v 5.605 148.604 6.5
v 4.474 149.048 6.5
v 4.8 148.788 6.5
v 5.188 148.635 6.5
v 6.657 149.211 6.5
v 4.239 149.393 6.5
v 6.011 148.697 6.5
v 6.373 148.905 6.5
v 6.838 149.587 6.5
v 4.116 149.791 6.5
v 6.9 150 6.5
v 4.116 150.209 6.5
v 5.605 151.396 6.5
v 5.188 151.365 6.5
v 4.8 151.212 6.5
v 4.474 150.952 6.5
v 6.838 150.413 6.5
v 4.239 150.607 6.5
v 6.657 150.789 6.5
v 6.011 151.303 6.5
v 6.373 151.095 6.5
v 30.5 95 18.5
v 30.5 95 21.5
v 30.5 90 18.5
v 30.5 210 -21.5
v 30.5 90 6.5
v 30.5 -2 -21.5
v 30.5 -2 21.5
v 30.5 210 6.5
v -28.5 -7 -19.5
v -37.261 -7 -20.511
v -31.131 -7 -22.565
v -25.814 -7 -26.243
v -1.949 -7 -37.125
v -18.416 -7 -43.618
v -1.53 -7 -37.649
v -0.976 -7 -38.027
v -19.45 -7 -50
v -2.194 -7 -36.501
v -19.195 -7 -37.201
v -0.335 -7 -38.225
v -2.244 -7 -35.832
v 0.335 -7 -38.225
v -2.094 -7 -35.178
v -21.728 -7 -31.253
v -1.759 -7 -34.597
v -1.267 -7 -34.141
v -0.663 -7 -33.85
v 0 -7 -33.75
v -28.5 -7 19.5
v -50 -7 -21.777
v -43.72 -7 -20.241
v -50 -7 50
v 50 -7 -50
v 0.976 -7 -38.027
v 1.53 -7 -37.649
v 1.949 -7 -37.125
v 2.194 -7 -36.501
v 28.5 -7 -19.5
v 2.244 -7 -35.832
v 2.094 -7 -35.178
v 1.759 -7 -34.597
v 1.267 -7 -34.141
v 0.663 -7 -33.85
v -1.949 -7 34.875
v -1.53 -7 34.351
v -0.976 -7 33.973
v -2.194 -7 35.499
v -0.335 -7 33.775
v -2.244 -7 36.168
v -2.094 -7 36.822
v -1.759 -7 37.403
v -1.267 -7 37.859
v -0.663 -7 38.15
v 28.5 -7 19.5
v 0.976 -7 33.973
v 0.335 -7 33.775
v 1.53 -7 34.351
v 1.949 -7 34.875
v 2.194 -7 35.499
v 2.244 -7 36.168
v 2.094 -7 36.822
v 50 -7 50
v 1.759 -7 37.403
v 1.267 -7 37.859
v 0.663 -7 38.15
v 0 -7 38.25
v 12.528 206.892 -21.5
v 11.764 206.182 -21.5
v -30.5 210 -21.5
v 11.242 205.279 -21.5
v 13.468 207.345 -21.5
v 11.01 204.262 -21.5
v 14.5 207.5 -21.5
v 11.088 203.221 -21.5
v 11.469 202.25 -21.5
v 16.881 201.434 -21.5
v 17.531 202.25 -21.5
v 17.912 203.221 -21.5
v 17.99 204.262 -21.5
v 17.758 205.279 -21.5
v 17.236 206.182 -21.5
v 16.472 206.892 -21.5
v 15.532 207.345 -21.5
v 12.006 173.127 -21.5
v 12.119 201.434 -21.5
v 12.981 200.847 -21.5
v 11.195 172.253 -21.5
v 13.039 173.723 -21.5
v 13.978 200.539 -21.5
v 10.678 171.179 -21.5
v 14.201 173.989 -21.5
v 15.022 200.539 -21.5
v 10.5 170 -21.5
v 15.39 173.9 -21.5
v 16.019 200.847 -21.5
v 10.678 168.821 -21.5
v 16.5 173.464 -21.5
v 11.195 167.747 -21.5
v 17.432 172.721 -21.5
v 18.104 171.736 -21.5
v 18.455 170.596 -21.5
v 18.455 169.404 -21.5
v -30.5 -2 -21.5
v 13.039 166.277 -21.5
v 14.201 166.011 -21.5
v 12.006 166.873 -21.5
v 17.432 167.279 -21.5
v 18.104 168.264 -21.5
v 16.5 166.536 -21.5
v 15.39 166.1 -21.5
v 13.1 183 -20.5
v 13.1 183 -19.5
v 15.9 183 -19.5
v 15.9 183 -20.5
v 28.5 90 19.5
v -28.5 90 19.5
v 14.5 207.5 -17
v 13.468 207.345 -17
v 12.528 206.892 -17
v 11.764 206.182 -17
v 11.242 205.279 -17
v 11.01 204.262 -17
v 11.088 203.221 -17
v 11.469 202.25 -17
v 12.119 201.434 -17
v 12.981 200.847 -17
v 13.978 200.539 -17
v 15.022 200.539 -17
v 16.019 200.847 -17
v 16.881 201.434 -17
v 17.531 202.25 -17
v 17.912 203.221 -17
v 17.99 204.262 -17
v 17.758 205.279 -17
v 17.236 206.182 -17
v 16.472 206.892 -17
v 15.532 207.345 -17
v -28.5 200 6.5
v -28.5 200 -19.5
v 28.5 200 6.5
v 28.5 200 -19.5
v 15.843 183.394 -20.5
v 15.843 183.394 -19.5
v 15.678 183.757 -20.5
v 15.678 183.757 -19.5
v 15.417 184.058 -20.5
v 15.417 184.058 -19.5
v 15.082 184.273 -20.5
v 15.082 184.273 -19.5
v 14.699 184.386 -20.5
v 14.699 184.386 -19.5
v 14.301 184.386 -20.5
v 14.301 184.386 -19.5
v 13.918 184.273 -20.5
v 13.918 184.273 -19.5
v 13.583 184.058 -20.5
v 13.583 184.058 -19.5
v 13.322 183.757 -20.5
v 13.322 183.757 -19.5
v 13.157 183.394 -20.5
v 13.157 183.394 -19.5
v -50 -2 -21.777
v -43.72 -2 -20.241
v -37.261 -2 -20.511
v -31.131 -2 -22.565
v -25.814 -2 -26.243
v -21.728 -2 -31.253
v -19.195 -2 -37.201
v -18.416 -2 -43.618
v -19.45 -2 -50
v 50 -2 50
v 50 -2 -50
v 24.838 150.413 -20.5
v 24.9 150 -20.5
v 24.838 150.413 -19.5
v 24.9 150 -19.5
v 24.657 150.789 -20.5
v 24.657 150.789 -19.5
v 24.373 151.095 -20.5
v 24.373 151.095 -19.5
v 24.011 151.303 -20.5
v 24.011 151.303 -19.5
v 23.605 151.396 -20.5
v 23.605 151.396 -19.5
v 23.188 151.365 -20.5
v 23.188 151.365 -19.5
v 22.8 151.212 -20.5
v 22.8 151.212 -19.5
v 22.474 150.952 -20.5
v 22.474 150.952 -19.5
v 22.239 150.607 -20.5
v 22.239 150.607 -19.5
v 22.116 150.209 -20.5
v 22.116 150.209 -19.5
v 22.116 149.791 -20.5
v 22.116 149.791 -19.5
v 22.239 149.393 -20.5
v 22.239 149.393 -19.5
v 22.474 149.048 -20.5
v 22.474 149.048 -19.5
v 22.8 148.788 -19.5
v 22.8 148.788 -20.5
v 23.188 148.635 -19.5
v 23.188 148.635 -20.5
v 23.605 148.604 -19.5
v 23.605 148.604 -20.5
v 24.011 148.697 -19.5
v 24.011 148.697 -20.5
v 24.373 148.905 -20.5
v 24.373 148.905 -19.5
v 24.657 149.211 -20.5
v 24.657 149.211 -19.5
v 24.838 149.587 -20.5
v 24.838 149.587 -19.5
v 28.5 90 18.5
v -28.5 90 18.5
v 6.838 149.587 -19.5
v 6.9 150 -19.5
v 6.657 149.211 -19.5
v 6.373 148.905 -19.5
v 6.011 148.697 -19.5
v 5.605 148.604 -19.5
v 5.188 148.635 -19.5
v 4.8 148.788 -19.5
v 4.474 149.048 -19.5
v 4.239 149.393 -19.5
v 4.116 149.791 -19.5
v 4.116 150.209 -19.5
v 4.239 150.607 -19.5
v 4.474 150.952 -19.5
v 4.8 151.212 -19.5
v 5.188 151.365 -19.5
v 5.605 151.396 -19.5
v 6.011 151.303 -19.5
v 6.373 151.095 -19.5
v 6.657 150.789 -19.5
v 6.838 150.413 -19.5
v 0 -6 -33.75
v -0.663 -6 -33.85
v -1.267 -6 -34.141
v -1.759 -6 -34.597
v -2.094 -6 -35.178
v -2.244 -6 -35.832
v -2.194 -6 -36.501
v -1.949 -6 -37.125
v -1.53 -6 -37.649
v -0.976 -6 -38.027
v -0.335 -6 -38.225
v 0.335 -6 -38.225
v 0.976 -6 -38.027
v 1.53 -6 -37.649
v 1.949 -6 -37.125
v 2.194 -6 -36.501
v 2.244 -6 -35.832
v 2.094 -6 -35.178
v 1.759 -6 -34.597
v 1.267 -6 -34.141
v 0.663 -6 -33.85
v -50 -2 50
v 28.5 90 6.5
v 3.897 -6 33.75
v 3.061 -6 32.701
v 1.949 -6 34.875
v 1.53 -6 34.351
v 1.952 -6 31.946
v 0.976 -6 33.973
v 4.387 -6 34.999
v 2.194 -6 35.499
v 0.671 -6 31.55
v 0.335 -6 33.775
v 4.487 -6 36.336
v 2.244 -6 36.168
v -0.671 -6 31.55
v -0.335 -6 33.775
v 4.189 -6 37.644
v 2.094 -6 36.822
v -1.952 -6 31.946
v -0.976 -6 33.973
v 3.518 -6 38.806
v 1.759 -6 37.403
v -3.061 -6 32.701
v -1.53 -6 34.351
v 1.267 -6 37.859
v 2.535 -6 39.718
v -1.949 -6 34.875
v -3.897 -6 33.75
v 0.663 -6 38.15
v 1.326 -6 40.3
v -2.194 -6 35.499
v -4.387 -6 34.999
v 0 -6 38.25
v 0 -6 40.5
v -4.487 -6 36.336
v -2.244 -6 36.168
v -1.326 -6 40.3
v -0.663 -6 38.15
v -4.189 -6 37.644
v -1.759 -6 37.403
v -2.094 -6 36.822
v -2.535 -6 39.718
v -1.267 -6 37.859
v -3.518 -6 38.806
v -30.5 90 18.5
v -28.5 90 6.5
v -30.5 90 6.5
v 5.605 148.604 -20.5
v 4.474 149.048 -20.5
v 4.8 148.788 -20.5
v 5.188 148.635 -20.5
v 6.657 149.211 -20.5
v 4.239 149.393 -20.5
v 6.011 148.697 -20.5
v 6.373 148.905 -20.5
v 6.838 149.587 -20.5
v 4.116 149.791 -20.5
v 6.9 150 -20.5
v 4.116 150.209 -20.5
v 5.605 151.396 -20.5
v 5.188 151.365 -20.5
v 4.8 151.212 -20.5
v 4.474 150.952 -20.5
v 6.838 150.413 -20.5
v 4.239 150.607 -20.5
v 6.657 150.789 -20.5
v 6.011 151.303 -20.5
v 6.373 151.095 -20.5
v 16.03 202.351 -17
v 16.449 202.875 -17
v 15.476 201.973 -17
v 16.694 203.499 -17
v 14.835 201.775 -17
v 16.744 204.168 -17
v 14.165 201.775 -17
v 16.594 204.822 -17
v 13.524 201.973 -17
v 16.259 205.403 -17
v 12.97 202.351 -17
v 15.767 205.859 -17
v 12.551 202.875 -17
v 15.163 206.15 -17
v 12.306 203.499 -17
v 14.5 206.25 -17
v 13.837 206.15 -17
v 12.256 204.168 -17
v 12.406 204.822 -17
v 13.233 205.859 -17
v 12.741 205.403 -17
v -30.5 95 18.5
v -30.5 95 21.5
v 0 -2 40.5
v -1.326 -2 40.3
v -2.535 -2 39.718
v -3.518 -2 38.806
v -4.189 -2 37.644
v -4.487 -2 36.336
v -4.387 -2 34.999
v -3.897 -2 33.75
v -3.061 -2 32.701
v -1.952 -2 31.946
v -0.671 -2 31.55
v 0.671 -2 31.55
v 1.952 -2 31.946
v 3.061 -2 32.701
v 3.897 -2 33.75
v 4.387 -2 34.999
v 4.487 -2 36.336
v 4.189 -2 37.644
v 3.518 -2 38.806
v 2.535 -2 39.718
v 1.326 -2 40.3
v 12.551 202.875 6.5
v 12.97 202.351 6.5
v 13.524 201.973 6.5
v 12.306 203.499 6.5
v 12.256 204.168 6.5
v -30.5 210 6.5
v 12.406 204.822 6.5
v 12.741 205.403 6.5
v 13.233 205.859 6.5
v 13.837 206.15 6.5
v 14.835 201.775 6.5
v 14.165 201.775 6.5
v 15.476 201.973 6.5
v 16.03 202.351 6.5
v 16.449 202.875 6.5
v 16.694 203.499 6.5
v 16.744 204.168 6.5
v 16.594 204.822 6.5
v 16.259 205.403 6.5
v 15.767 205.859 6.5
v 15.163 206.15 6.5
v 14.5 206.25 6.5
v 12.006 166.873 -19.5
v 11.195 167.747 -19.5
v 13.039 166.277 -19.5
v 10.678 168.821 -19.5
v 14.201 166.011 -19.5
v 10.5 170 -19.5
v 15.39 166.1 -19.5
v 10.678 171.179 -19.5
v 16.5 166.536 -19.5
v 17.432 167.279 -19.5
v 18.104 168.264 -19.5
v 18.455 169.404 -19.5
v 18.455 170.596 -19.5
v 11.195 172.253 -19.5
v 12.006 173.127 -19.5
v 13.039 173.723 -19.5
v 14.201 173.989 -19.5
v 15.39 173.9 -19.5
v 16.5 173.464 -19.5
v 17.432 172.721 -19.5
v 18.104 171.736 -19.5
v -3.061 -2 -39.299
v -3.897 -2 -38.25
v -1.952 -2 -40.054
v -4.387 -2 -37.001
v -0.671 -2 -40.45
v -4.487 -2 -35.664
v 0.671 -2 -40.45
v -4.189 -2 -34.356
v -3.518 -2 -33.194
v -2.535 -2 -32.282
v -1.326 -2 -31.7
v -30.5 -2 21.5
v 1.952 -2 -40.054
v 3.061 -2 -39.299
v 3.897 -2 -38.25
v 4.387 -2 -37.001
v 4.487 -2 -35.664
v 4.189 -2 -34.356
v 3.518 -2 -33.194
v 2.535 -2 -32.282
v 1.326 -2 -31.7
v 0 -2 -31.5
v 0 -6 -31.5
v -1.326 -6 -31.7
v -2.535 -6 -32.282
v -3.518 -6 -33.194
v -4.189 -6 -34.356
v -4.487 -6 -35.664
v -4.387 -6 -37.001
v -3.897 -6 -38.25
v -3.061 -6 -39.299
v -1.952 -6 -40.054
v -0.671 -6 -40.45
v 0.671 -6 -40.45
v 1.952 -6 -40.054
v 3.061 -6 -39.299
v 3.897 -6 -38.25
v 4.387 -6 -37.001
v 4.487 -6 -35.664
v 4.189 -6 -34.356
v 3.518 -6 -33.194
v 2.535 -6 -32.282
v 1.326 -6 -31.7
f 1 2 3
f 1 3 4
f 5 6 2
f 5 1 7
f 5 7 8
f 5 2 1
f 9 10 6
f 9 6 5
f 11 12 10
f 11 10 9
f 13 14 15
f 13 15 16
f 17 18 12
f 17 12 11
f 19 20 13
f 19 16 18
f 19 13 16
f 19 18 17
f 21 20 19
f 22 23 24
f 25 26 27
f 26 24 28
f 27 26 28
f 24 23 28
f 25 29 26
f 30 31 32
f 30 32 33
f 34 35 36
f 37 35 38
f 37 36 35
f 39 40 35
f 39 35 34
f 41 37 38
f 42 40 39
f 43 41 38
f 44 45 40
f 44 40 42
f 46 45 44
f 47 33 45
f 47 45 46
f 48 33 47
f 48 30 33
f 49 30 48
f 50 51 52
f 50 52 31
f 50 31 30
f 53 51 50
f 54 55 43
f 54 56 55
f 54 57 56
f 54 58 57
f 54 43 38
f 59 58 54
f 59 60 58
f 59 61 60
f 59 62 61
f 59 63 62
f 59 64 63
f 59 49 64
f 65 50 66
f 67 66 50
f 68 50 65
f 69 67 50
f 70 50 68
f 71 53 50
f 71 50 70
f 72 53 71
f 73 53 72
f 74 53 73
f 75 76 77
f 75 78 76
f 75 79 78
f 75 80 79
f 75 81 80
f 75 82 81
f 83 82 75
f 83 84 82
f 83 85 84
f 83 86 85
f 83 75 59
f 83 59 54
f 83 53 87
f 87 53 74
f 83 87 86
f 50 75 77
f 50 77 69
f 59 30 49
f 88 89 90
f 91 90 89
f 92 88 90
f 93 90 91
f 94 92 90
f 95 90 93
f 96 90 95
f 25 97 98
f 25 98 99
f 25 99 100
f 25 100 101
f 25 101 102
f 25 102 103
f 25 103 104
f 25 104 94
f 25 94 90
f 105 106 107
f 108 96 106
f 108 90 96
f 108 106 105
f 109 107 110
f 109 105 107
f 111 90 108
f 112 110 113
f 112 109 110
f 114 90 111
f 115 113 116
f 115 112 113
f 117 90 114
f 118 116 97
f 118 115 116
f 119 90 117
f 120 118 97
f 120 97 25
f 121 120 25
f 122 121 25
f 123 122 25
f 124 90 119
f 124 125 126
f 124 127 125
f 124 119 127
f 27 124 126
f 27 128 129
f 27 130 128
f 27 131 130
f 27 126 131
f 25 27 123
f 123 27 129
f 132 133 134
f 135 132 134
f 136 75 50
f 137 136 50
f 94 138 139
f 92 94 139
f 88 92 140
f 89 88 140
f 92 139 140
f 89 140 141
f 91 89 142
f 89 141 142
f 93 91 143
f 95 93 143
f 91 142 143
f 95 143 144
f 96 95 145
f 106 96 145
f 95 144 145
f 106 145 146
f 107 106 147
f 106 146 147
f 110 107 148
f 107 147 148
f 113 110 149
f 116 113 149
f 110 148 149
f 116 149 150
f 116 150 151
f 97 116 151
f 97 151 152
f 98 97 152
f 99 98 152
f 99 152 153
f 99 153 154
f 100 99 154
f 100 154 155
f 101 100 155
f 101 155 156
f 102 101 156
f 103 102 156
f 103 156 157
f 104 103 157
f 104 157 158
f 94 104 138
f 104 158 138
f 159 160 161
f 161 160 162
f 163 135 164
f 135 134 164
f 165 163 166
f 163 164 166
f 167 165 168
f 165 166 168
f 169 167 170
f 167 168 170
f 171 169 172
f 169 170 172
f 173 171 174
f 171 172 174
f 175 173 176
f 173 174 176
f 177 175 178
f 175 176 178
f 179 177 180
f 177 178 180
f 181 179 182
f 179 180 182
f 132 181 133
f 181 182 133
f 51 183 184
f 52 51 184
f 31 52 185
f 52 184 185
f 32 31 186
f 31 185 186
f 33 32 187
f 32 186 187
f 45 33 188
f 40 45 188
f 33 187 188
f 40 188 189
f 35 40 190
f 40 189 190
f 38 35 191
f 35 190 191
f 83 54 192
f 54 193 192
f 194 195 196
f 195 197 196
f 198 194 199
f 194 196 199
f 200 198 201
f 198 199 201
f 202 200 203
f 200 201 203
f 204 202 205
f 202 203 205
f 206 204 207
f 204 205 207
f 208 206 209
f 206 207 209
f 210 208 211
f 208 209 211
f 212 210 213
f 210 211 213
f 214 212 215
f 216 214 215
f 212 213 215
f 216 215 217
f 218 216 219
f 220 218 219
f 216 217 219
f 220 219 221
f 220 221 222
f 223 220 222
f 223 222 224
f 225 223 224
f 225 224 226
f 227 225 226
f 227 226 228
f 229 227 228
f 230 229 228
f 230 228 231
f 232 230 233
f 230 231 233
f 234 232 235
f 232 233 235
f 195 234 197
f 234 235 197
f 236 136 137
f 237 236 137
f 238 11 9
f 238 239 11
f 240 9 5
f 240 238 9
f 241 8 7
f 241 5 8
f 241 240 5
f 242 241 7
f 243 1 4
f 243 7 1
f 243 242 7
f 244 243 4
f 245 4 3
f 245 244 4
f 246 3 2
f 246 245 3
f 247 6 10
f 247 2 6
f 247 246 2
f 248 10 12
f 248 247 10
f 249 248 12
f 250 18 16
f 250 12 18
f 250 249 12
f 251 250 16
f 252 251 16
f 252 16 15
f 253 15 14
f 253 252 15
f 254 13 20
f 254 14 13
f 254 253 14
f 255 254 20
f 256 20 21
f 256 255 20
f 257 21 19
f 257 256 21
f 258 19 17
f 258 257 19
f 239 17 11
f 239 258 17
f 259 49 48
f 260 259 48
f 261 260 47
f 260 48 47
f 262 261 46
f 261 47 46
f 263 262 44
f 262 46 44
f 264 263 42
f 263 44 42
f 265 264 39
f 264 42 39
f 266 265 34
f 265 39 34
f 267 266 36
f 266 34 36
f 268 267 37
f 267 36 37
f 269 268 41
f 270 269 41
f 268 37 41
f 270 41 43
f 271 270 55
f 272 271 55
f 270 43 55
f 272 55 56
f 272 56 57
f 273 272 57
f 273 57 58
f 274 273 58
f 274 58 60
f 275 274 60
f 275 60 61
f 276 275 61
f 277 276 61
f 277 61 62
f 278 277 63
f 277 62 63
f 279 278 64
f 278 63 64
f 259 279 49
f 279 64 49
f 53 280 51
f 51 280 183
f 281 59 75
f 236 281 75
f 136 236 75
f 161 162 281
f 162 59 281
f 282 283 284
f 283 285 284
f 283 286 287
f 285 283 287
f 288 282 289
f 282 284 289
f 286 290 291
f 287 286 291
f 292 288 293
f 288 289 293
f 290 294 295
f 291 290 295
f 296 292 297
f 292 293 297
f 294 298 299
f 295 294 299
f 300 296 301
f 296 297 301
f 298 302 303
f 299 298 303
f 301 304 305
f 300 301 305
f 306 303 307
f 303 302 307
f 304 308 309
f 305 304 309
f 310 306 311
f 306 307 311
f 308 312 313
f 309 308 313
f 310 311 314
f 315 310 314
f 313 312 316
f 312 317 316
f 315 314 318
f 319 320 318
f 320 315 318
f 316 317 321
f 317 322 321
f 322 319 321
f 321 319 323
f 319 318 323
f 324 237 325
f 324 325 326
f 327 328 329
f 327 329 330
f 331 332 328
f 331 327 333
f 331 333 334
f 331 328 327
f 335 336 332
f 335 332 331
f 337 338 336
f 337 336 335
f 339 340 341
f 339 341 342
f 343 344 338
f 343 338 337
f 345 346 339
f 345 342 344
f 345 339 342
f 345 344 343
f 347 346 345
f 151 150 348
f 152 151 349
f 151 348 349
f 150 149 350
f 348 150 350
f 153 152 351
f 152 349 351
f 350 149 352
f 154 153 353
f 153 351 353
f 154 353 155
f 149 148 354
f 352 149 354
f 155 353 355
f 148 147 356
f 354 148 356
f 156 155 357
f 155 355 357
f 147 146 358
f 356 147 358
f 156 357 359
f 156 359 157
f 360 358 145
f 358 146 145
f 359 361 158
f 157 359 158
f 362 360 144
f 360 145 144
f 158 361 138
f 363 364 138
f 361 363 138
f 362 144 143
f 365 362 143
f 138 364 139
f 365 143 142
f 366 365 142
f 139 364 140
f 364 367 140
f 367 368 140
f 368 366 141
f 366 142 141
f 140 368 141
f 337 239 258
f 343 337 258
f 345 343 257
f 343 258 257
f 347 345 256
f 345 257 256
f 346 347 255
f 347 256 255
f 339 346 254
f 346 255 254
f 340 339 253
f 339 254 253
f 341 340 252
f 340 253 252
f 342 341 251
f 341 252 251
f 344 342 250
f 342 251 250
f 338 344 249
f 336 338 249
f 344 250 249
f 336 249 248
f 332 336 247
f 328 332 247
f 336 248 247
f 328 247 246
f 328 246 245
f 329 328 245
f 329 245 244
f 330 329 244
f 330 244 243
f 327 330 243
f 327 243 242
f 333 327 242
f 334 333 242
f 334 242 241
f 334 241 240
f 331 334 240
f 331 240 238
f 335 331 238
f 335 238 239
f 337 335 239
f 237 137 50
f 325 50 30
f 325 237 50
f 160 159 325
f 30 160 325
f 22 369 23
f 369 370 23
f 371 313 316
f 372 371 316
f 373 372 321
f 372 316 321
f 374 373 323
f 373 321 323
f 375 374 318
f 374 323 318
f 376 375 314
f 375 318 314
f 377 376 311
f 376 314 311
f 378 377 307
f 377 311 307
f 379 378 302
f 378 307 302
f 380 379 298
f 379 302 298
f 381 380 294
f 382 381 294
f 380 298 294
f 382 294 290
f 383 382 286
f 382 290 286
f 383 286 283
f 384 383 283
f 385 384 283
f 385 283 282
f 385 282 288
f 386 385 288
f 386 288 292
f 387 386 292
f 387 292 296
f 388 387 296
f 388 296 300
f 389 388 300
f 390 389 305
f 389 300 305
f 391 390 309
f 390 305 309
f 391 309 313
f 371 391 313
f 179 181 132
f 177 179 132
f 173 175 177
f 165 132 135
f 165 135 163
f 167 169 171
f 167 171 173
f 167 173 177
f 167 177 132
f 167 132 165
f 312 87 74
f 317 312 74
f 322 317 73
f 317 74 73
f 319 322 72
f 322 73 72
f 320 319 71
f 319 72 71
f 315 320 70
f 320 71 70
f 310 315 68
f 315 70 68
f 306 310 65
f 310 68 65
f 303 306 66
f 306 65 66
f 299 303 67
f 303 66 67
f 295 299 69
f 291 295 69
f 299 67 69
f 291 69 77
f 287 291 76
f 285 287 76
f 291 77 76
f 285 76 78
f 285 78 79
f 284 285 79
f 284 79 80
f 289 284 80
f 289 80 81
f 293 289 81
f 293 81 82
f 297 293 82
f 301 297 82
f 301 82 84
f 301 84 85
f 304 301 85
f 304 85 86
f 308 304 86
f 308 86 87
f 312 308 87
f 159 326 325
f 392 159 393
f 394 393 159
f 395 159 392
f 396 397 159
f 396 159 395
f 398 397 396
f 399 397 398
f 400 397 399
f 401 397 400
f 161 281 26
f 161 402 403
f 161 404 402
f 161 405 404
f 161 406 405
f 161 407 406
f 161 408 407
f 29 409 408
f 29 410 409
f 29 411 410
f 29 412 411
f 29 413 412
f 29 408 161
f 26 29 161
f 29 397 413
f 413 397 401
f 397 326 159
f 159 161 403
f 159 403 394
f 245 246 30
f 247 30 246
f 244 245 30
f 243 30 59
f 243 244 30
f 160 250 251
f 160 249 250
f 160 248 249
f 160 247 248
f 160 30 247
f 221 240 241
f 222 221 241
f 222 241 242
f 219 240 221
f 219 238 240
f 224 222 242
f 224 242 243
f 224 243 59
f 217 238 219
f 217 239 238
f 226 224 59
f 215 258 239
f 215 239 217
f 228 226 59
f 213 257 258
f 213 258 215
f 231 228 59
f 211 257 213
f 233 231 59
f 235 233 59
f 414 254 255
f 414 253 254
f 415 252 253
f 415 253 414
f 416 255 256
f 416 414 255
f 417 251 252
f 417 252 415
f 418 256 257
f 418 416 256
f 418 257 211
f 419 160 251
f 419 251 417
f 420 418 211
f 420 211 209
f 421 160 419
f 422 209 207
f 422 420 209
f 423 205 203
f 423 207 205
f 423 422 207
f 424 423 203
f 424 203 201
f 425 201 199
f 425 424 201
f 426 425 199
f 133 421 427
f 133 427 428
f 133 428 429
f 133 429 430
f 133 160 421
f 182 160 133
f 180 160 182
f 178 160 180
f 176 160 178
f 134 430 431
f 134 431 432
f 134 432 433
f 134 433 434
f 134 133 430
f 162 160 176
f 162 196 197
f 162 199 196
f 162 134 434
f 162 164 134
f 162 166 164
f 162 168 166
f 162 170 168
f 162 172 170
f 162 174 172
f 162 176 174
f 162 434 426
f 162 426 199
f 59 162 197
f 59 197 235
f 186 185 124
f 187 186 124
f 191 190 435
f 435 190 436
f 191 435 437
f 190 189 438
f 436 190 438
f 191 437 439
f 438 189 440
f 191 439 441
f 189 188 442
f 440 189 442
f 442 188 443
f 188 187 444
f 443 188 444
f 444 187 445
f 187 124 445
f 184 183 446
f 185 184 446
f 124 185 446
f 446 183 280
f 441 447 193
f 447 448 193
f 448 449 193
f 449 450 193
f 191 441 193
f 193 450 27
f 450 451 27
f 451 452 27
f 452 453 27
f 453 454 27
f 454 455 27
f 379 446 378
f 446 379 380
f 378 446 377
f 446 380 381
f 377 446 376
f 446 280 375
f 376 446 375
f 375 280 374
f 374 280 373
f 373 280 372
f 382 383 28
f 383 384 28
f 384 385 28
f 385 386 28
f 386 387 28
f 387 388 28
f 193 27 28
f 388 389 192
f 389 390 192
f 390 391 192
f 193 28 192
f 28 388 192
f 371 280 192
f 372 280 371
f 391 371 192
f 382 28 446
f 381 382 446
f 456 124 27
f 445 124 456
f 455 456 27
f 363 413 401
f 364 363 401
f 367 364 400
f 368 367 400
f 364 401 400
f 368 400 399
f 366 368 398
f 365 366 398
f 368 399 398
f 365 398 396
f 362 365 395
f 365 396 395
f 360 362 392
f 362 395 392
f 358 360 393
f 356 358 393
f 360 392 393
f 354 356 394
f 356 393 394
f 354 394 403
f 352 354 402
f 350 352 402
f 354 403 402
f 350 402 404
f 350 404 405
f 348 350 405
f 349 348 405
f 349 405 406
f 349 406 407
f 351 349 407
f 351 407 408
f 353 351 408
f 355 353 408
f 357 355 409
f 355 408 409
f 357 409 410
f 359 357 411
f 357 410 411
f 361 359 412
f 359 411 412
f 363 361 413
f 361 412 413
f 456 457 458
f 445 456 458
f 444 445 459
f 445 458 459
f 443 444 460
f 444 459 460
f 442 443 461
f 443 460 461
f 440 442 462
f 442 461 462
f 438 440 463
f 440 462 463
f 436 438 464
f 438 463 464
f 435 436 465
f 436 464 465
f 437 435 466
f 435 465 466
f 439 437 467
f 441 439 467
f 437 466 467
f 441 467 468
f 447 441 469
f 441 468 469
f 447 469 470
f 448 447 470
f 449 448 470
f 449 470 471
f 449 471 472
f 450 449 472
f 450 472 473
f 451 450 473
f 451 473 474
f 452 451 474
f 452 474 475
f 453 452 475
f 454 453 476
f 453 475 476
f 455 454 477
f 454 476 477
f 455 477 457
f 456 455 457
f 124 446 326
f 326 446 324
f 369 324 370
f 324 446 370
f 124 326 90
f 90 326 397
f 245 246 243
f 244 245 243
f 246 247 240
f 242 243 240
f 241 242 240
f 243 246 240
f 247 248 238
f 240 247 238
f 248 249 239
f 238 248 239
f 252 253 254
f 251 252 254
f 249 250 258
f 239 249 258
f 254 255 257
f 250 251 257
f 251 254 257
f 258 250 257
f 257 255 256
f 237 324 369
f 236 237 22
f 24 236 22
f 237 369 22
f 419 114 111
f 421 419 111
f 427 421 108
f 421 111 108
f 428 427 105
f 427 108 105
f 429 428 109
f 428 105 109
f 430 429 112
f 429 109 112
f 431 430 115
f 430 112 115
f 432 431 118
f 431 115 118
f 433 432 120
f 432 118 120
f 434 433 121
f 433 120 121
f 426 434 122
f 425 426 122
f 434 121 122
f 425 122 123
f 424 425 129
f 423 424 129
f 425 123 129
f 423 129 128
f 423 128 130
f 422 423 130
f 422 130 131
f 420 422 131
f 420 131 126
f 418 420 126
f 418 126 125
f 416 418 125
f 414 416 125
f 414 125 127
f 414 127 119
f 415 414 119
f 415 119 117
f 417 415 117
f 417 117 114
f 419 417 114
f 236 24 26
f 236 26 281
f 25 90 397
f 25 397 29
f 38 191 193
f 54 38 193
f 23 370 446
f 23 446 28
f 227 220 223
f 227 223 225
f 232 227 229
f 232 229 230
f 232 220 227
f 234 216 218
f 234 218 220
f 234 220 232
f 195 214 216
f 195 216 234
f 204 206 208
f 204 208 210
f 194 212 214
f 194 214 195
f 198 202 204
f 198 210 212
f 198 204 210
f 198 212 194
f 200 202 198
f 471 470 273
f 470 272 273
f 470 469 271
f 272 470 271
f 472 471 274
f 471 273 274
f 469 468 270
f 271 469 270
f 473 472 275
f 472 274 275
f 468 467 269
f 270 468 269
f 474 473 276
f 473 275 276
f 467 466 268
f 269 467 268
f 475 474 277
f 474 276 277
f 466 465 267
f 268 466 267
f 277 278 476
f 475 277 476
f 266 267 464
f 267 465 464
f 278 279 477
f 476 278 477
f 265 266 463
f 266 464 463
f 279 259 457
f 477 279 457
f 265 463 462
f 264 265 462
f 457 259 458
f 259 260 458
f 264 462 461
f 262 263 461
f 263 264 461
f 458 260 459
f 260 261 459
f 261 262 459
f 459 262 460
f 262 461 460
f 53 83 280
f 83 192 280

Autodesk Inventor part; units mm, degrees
ref_plane "YZ Plane" through (0, 0, 0) normal (1, 0, 0) x (0, 1, 0)
ref_plane "XZ Plane" through (0, 0, 0) normal (0, 1, 0) x (-1, 0, 0)
ref_plane "XY Plane" through (0, 0, 0) normal (0, 0, 1) x (1, 0, 0)
sketch "Sketch1" plane through (0, 0, 0) normal (0, 1, 0) x (-1, 0, 0)
  line L0 (-28.5, 19.5) -> (28.5, 19.5)
  line L1 (28.5, 19.5) -> (28.5, -19.5)
  line L2 (28.5, -19.5) -> (-28.5, -19.5)
  line L3 (-28.5, -19.5) -> (-28.5, 19.5)
  line L4 (-28.5, 19.5) -> (28.5, -19.5) construction
  line L5 (28.5, 19.5) -> (-28.5, -19.5) construction
  line L6 (-30.5, 21.5) -> (30.5, 21.5)
  line L7 (30.5, 21.5) -> (30.5, -21.5)
  line L8 (30.5, -21.5) -> (-30.5, -21.5)
  line L9 (-30.5, -21.5) -> (-30.5, 21.5)
  line L10 (-30.5, 21.5) -> (30.5, -21.5) construction
  line L11 (30.5, 21.5) -> (-30.5, -21.5) construction
  point P0 (0, 0)
  point P1 (0, -19.5)
  point P2 (0, -21.5)
  point P3 (0, 0)
  point P4 (0, 0)
  dimension "d1" = 57
  dimension "d2" = 39
  dimension "d3" = 61
  dimension "d4" = 43
extrude "Extrusion2" add sketch "Sketch1" against normal blind 2 contours L0 L1 L2 L3 | L6 L7 L8 L9
extrude "Extrusion3" add sketch "Sketch1" along normal blind 200
sketch "Sketch2" plane through (0, 200, 0) normal (0, 1, 0) x (1, 0, 0)
  line L0 (-30.5, -21.5) -> (-30.5, 21.5) projected
  line L1 (30.5, -21.5) -> (-30.5, -21.5)
  line L2 (-30.5, -21.5) -> (-30.5, 21.5)
  line L3 (-30.5, 21.5) -> (30.5, 21.5)
  line L4 (30.5, 21.5) -> (30.5, -21.5)
  line L5 (30.5, -21.5) -> (-30.5, 21.5) construction
  line L6 (-30.5, -21.5) -> (30.5, 21.5) construction
  point P0 (0, 0)
extrude "Extrusion4" add sketch "Sketch2" along normal blind 10
sketch "Sketch6" plane through (0, -2, 0) normal (0, -1, 0) x (1, 0, 0)
  line L0 (-30.5, -21.5) -> (30.5, -21.5)
  line L1 (30.5, -21.5) -> (30.5, 21.5)
  line L2 (30.5, 21.5) -> (-30.5, 21.5)
  line L3 (-30.5, 21.5) -> (-30.5, -21.5)
  line L4 (-30.5, -21.5) -> (30.5, 21.5) construction
  line L5 (30.5, -21.5) -> (-30.5, 21.5) construction
  line L6 (-50, -50) -> (50, -50)
  line L7 (50, -50) -> (50, 50)
  line L8 (50, 50) -> (-50, 50)
  line L9 (-50, 50) -> (-50, -50)
  line L10 (-50, -50) -> (50, 50) construction
  line L11 (50, -50) -> (-50, 50) construction
  circle A0 centre (0, 0) radius 7.25
  dimension "d27" = 100
  dimension "d28" = 100
extrude "Extrusion8" add sketch "Sketch6" along normal blind 5 contours L9 L8 L7 L6
extrude "Extrusion9" add sketch "Sketch6" along normal blind 5 contours L3 L2 L1 L0
extrude "Extrusion11" cut sketch "Sketch1" against normal blind 7 contours L0 L1 L2 L3
sketch "Sketch9" plane through (-30.5, 210, 21.5) normal (0, 0, 1) x (1, 0, 0)
  point P0 (30.5, -210)
sketch "Sketch10" plane through (-30.5, 210, 21.5) normal (0, 0, 1) x (1, 0, 0)
  line L0 (0, 0) -> (61, 0) projected
  line L1 (0, 0) -> (61, 0)
  line L2 (61, 0) -> (61, -120)
  line L3 (61, -120) -> (0, -120)
  line L4 (0, -120) -> (0, 0)
  line L5 (0, -120) -> (0, -115)
  line L6 (0, -115) -> (61, -115)
  point P0 (30.5, -210)
  dimension "d95" = 1.5
  dimension "d57" = 120
  dimension "d58" = 5
extrude "Extrusion12" cut sketch "Sketch10" against normal blind 15
extrude "Extrusion13" add sketch "Sketch10" against normal blind 3 contours L6 L2 L3 L4
sketch "Sketch11" plane through (30.5, 210, -21.5) normal (0, 0, -1) x (-1, 0, 0)
  line L0 (0, 0) -> (0, -120) projected
  point P0 (30.5, -210)
  point P1 (16, -6)
  dimension "d106" = 16
hole "Hole2" at (14.5, 204, -21.5) direction (0, 0, 1) diameter 4.5 end through all counterbore diameter 7 counterbore depth 4.5
sketch "Sketch12" plane through (30.5, 210, -21.5) normal (0, 0, -1) x (-1, 0, 0)
  circle A0 centre (16, -40) radius 4
  circle A1 centre (16, -6) radius 3.5 projected
  line L0 (61, -212) -> (61, 0) projected
  line L1 (0, 0) -> (0, -212) projected
  point P0 (30.5, -210)
  point P1 (13.5, -10)
  point P2 (61, -217)
  dimension "d94" = 8
  dimension "d104" = 34
  dimension "d108" = 16
extrude "Extrusion14" cut sketch "Sketch12" against normal through all contours A0
sketch "Sketch13" plane through (-28.5, -7, -19.5) normal (0, 0, 1) x (1, 0, 0)
  circle A0 centre (43, 190) radius 1.4
  line L0 (57, 207) -> (57, 0) projected
  line L1 (41.6, 190) -> (44.4, 190)
  circle A1 centre (52, 157) radius 1.4
  circle A2 centre (34, 157) radius 1.4
  point P0 (28.5, 7)
  dimension "d101" = 2.8
  dimension "d105" = 14
  dimension "d121" = 2.8
  dimension "d122" = 2.8
extrude "Extrusion15" cut sketch "Sketch13" against normal blind 1 contours L1 A0 picked at (43.4531, 190.1117)
sketch "Sketch14" plane through (0, -2, 0) normal (0, 1, 0) x (1, 0, 0)
  point P0 (0, 0)
  point P1 (0, 36)
  point P2 (0, -36)
hole "Hole3" at (0, -2, -36) at (0, -2, 36) direction (0, -1, 0) diameter 4.5 end through all counterbore diameter 9 counterbore depth 4
extrude "Extrusion16" cut sketch "Sketch13" against normal blind 1 contours A1 | A2
extrude "Extrusion17" add sketch "Sketch13" along normal blind 26 contours A2
sketch "Sketch15" plane through (0, -2, 0) normal (0, 1, 0) x (1, 0, 0)
  line L0 (-50, -50) -> (-50, 50) projected
  line L1 (-50, 50) -> (50, 50) projected
  arc A0 (-50, 21.777) -> (-19.4504, 50) centre (-41.4426, 43.1597) ccw
  point P0 (0, 0)
extrude "Extrusion18" cut sketch "Sketch15" against normal blind 5
properties part number "Housing of DC Motor_3DPrint"
